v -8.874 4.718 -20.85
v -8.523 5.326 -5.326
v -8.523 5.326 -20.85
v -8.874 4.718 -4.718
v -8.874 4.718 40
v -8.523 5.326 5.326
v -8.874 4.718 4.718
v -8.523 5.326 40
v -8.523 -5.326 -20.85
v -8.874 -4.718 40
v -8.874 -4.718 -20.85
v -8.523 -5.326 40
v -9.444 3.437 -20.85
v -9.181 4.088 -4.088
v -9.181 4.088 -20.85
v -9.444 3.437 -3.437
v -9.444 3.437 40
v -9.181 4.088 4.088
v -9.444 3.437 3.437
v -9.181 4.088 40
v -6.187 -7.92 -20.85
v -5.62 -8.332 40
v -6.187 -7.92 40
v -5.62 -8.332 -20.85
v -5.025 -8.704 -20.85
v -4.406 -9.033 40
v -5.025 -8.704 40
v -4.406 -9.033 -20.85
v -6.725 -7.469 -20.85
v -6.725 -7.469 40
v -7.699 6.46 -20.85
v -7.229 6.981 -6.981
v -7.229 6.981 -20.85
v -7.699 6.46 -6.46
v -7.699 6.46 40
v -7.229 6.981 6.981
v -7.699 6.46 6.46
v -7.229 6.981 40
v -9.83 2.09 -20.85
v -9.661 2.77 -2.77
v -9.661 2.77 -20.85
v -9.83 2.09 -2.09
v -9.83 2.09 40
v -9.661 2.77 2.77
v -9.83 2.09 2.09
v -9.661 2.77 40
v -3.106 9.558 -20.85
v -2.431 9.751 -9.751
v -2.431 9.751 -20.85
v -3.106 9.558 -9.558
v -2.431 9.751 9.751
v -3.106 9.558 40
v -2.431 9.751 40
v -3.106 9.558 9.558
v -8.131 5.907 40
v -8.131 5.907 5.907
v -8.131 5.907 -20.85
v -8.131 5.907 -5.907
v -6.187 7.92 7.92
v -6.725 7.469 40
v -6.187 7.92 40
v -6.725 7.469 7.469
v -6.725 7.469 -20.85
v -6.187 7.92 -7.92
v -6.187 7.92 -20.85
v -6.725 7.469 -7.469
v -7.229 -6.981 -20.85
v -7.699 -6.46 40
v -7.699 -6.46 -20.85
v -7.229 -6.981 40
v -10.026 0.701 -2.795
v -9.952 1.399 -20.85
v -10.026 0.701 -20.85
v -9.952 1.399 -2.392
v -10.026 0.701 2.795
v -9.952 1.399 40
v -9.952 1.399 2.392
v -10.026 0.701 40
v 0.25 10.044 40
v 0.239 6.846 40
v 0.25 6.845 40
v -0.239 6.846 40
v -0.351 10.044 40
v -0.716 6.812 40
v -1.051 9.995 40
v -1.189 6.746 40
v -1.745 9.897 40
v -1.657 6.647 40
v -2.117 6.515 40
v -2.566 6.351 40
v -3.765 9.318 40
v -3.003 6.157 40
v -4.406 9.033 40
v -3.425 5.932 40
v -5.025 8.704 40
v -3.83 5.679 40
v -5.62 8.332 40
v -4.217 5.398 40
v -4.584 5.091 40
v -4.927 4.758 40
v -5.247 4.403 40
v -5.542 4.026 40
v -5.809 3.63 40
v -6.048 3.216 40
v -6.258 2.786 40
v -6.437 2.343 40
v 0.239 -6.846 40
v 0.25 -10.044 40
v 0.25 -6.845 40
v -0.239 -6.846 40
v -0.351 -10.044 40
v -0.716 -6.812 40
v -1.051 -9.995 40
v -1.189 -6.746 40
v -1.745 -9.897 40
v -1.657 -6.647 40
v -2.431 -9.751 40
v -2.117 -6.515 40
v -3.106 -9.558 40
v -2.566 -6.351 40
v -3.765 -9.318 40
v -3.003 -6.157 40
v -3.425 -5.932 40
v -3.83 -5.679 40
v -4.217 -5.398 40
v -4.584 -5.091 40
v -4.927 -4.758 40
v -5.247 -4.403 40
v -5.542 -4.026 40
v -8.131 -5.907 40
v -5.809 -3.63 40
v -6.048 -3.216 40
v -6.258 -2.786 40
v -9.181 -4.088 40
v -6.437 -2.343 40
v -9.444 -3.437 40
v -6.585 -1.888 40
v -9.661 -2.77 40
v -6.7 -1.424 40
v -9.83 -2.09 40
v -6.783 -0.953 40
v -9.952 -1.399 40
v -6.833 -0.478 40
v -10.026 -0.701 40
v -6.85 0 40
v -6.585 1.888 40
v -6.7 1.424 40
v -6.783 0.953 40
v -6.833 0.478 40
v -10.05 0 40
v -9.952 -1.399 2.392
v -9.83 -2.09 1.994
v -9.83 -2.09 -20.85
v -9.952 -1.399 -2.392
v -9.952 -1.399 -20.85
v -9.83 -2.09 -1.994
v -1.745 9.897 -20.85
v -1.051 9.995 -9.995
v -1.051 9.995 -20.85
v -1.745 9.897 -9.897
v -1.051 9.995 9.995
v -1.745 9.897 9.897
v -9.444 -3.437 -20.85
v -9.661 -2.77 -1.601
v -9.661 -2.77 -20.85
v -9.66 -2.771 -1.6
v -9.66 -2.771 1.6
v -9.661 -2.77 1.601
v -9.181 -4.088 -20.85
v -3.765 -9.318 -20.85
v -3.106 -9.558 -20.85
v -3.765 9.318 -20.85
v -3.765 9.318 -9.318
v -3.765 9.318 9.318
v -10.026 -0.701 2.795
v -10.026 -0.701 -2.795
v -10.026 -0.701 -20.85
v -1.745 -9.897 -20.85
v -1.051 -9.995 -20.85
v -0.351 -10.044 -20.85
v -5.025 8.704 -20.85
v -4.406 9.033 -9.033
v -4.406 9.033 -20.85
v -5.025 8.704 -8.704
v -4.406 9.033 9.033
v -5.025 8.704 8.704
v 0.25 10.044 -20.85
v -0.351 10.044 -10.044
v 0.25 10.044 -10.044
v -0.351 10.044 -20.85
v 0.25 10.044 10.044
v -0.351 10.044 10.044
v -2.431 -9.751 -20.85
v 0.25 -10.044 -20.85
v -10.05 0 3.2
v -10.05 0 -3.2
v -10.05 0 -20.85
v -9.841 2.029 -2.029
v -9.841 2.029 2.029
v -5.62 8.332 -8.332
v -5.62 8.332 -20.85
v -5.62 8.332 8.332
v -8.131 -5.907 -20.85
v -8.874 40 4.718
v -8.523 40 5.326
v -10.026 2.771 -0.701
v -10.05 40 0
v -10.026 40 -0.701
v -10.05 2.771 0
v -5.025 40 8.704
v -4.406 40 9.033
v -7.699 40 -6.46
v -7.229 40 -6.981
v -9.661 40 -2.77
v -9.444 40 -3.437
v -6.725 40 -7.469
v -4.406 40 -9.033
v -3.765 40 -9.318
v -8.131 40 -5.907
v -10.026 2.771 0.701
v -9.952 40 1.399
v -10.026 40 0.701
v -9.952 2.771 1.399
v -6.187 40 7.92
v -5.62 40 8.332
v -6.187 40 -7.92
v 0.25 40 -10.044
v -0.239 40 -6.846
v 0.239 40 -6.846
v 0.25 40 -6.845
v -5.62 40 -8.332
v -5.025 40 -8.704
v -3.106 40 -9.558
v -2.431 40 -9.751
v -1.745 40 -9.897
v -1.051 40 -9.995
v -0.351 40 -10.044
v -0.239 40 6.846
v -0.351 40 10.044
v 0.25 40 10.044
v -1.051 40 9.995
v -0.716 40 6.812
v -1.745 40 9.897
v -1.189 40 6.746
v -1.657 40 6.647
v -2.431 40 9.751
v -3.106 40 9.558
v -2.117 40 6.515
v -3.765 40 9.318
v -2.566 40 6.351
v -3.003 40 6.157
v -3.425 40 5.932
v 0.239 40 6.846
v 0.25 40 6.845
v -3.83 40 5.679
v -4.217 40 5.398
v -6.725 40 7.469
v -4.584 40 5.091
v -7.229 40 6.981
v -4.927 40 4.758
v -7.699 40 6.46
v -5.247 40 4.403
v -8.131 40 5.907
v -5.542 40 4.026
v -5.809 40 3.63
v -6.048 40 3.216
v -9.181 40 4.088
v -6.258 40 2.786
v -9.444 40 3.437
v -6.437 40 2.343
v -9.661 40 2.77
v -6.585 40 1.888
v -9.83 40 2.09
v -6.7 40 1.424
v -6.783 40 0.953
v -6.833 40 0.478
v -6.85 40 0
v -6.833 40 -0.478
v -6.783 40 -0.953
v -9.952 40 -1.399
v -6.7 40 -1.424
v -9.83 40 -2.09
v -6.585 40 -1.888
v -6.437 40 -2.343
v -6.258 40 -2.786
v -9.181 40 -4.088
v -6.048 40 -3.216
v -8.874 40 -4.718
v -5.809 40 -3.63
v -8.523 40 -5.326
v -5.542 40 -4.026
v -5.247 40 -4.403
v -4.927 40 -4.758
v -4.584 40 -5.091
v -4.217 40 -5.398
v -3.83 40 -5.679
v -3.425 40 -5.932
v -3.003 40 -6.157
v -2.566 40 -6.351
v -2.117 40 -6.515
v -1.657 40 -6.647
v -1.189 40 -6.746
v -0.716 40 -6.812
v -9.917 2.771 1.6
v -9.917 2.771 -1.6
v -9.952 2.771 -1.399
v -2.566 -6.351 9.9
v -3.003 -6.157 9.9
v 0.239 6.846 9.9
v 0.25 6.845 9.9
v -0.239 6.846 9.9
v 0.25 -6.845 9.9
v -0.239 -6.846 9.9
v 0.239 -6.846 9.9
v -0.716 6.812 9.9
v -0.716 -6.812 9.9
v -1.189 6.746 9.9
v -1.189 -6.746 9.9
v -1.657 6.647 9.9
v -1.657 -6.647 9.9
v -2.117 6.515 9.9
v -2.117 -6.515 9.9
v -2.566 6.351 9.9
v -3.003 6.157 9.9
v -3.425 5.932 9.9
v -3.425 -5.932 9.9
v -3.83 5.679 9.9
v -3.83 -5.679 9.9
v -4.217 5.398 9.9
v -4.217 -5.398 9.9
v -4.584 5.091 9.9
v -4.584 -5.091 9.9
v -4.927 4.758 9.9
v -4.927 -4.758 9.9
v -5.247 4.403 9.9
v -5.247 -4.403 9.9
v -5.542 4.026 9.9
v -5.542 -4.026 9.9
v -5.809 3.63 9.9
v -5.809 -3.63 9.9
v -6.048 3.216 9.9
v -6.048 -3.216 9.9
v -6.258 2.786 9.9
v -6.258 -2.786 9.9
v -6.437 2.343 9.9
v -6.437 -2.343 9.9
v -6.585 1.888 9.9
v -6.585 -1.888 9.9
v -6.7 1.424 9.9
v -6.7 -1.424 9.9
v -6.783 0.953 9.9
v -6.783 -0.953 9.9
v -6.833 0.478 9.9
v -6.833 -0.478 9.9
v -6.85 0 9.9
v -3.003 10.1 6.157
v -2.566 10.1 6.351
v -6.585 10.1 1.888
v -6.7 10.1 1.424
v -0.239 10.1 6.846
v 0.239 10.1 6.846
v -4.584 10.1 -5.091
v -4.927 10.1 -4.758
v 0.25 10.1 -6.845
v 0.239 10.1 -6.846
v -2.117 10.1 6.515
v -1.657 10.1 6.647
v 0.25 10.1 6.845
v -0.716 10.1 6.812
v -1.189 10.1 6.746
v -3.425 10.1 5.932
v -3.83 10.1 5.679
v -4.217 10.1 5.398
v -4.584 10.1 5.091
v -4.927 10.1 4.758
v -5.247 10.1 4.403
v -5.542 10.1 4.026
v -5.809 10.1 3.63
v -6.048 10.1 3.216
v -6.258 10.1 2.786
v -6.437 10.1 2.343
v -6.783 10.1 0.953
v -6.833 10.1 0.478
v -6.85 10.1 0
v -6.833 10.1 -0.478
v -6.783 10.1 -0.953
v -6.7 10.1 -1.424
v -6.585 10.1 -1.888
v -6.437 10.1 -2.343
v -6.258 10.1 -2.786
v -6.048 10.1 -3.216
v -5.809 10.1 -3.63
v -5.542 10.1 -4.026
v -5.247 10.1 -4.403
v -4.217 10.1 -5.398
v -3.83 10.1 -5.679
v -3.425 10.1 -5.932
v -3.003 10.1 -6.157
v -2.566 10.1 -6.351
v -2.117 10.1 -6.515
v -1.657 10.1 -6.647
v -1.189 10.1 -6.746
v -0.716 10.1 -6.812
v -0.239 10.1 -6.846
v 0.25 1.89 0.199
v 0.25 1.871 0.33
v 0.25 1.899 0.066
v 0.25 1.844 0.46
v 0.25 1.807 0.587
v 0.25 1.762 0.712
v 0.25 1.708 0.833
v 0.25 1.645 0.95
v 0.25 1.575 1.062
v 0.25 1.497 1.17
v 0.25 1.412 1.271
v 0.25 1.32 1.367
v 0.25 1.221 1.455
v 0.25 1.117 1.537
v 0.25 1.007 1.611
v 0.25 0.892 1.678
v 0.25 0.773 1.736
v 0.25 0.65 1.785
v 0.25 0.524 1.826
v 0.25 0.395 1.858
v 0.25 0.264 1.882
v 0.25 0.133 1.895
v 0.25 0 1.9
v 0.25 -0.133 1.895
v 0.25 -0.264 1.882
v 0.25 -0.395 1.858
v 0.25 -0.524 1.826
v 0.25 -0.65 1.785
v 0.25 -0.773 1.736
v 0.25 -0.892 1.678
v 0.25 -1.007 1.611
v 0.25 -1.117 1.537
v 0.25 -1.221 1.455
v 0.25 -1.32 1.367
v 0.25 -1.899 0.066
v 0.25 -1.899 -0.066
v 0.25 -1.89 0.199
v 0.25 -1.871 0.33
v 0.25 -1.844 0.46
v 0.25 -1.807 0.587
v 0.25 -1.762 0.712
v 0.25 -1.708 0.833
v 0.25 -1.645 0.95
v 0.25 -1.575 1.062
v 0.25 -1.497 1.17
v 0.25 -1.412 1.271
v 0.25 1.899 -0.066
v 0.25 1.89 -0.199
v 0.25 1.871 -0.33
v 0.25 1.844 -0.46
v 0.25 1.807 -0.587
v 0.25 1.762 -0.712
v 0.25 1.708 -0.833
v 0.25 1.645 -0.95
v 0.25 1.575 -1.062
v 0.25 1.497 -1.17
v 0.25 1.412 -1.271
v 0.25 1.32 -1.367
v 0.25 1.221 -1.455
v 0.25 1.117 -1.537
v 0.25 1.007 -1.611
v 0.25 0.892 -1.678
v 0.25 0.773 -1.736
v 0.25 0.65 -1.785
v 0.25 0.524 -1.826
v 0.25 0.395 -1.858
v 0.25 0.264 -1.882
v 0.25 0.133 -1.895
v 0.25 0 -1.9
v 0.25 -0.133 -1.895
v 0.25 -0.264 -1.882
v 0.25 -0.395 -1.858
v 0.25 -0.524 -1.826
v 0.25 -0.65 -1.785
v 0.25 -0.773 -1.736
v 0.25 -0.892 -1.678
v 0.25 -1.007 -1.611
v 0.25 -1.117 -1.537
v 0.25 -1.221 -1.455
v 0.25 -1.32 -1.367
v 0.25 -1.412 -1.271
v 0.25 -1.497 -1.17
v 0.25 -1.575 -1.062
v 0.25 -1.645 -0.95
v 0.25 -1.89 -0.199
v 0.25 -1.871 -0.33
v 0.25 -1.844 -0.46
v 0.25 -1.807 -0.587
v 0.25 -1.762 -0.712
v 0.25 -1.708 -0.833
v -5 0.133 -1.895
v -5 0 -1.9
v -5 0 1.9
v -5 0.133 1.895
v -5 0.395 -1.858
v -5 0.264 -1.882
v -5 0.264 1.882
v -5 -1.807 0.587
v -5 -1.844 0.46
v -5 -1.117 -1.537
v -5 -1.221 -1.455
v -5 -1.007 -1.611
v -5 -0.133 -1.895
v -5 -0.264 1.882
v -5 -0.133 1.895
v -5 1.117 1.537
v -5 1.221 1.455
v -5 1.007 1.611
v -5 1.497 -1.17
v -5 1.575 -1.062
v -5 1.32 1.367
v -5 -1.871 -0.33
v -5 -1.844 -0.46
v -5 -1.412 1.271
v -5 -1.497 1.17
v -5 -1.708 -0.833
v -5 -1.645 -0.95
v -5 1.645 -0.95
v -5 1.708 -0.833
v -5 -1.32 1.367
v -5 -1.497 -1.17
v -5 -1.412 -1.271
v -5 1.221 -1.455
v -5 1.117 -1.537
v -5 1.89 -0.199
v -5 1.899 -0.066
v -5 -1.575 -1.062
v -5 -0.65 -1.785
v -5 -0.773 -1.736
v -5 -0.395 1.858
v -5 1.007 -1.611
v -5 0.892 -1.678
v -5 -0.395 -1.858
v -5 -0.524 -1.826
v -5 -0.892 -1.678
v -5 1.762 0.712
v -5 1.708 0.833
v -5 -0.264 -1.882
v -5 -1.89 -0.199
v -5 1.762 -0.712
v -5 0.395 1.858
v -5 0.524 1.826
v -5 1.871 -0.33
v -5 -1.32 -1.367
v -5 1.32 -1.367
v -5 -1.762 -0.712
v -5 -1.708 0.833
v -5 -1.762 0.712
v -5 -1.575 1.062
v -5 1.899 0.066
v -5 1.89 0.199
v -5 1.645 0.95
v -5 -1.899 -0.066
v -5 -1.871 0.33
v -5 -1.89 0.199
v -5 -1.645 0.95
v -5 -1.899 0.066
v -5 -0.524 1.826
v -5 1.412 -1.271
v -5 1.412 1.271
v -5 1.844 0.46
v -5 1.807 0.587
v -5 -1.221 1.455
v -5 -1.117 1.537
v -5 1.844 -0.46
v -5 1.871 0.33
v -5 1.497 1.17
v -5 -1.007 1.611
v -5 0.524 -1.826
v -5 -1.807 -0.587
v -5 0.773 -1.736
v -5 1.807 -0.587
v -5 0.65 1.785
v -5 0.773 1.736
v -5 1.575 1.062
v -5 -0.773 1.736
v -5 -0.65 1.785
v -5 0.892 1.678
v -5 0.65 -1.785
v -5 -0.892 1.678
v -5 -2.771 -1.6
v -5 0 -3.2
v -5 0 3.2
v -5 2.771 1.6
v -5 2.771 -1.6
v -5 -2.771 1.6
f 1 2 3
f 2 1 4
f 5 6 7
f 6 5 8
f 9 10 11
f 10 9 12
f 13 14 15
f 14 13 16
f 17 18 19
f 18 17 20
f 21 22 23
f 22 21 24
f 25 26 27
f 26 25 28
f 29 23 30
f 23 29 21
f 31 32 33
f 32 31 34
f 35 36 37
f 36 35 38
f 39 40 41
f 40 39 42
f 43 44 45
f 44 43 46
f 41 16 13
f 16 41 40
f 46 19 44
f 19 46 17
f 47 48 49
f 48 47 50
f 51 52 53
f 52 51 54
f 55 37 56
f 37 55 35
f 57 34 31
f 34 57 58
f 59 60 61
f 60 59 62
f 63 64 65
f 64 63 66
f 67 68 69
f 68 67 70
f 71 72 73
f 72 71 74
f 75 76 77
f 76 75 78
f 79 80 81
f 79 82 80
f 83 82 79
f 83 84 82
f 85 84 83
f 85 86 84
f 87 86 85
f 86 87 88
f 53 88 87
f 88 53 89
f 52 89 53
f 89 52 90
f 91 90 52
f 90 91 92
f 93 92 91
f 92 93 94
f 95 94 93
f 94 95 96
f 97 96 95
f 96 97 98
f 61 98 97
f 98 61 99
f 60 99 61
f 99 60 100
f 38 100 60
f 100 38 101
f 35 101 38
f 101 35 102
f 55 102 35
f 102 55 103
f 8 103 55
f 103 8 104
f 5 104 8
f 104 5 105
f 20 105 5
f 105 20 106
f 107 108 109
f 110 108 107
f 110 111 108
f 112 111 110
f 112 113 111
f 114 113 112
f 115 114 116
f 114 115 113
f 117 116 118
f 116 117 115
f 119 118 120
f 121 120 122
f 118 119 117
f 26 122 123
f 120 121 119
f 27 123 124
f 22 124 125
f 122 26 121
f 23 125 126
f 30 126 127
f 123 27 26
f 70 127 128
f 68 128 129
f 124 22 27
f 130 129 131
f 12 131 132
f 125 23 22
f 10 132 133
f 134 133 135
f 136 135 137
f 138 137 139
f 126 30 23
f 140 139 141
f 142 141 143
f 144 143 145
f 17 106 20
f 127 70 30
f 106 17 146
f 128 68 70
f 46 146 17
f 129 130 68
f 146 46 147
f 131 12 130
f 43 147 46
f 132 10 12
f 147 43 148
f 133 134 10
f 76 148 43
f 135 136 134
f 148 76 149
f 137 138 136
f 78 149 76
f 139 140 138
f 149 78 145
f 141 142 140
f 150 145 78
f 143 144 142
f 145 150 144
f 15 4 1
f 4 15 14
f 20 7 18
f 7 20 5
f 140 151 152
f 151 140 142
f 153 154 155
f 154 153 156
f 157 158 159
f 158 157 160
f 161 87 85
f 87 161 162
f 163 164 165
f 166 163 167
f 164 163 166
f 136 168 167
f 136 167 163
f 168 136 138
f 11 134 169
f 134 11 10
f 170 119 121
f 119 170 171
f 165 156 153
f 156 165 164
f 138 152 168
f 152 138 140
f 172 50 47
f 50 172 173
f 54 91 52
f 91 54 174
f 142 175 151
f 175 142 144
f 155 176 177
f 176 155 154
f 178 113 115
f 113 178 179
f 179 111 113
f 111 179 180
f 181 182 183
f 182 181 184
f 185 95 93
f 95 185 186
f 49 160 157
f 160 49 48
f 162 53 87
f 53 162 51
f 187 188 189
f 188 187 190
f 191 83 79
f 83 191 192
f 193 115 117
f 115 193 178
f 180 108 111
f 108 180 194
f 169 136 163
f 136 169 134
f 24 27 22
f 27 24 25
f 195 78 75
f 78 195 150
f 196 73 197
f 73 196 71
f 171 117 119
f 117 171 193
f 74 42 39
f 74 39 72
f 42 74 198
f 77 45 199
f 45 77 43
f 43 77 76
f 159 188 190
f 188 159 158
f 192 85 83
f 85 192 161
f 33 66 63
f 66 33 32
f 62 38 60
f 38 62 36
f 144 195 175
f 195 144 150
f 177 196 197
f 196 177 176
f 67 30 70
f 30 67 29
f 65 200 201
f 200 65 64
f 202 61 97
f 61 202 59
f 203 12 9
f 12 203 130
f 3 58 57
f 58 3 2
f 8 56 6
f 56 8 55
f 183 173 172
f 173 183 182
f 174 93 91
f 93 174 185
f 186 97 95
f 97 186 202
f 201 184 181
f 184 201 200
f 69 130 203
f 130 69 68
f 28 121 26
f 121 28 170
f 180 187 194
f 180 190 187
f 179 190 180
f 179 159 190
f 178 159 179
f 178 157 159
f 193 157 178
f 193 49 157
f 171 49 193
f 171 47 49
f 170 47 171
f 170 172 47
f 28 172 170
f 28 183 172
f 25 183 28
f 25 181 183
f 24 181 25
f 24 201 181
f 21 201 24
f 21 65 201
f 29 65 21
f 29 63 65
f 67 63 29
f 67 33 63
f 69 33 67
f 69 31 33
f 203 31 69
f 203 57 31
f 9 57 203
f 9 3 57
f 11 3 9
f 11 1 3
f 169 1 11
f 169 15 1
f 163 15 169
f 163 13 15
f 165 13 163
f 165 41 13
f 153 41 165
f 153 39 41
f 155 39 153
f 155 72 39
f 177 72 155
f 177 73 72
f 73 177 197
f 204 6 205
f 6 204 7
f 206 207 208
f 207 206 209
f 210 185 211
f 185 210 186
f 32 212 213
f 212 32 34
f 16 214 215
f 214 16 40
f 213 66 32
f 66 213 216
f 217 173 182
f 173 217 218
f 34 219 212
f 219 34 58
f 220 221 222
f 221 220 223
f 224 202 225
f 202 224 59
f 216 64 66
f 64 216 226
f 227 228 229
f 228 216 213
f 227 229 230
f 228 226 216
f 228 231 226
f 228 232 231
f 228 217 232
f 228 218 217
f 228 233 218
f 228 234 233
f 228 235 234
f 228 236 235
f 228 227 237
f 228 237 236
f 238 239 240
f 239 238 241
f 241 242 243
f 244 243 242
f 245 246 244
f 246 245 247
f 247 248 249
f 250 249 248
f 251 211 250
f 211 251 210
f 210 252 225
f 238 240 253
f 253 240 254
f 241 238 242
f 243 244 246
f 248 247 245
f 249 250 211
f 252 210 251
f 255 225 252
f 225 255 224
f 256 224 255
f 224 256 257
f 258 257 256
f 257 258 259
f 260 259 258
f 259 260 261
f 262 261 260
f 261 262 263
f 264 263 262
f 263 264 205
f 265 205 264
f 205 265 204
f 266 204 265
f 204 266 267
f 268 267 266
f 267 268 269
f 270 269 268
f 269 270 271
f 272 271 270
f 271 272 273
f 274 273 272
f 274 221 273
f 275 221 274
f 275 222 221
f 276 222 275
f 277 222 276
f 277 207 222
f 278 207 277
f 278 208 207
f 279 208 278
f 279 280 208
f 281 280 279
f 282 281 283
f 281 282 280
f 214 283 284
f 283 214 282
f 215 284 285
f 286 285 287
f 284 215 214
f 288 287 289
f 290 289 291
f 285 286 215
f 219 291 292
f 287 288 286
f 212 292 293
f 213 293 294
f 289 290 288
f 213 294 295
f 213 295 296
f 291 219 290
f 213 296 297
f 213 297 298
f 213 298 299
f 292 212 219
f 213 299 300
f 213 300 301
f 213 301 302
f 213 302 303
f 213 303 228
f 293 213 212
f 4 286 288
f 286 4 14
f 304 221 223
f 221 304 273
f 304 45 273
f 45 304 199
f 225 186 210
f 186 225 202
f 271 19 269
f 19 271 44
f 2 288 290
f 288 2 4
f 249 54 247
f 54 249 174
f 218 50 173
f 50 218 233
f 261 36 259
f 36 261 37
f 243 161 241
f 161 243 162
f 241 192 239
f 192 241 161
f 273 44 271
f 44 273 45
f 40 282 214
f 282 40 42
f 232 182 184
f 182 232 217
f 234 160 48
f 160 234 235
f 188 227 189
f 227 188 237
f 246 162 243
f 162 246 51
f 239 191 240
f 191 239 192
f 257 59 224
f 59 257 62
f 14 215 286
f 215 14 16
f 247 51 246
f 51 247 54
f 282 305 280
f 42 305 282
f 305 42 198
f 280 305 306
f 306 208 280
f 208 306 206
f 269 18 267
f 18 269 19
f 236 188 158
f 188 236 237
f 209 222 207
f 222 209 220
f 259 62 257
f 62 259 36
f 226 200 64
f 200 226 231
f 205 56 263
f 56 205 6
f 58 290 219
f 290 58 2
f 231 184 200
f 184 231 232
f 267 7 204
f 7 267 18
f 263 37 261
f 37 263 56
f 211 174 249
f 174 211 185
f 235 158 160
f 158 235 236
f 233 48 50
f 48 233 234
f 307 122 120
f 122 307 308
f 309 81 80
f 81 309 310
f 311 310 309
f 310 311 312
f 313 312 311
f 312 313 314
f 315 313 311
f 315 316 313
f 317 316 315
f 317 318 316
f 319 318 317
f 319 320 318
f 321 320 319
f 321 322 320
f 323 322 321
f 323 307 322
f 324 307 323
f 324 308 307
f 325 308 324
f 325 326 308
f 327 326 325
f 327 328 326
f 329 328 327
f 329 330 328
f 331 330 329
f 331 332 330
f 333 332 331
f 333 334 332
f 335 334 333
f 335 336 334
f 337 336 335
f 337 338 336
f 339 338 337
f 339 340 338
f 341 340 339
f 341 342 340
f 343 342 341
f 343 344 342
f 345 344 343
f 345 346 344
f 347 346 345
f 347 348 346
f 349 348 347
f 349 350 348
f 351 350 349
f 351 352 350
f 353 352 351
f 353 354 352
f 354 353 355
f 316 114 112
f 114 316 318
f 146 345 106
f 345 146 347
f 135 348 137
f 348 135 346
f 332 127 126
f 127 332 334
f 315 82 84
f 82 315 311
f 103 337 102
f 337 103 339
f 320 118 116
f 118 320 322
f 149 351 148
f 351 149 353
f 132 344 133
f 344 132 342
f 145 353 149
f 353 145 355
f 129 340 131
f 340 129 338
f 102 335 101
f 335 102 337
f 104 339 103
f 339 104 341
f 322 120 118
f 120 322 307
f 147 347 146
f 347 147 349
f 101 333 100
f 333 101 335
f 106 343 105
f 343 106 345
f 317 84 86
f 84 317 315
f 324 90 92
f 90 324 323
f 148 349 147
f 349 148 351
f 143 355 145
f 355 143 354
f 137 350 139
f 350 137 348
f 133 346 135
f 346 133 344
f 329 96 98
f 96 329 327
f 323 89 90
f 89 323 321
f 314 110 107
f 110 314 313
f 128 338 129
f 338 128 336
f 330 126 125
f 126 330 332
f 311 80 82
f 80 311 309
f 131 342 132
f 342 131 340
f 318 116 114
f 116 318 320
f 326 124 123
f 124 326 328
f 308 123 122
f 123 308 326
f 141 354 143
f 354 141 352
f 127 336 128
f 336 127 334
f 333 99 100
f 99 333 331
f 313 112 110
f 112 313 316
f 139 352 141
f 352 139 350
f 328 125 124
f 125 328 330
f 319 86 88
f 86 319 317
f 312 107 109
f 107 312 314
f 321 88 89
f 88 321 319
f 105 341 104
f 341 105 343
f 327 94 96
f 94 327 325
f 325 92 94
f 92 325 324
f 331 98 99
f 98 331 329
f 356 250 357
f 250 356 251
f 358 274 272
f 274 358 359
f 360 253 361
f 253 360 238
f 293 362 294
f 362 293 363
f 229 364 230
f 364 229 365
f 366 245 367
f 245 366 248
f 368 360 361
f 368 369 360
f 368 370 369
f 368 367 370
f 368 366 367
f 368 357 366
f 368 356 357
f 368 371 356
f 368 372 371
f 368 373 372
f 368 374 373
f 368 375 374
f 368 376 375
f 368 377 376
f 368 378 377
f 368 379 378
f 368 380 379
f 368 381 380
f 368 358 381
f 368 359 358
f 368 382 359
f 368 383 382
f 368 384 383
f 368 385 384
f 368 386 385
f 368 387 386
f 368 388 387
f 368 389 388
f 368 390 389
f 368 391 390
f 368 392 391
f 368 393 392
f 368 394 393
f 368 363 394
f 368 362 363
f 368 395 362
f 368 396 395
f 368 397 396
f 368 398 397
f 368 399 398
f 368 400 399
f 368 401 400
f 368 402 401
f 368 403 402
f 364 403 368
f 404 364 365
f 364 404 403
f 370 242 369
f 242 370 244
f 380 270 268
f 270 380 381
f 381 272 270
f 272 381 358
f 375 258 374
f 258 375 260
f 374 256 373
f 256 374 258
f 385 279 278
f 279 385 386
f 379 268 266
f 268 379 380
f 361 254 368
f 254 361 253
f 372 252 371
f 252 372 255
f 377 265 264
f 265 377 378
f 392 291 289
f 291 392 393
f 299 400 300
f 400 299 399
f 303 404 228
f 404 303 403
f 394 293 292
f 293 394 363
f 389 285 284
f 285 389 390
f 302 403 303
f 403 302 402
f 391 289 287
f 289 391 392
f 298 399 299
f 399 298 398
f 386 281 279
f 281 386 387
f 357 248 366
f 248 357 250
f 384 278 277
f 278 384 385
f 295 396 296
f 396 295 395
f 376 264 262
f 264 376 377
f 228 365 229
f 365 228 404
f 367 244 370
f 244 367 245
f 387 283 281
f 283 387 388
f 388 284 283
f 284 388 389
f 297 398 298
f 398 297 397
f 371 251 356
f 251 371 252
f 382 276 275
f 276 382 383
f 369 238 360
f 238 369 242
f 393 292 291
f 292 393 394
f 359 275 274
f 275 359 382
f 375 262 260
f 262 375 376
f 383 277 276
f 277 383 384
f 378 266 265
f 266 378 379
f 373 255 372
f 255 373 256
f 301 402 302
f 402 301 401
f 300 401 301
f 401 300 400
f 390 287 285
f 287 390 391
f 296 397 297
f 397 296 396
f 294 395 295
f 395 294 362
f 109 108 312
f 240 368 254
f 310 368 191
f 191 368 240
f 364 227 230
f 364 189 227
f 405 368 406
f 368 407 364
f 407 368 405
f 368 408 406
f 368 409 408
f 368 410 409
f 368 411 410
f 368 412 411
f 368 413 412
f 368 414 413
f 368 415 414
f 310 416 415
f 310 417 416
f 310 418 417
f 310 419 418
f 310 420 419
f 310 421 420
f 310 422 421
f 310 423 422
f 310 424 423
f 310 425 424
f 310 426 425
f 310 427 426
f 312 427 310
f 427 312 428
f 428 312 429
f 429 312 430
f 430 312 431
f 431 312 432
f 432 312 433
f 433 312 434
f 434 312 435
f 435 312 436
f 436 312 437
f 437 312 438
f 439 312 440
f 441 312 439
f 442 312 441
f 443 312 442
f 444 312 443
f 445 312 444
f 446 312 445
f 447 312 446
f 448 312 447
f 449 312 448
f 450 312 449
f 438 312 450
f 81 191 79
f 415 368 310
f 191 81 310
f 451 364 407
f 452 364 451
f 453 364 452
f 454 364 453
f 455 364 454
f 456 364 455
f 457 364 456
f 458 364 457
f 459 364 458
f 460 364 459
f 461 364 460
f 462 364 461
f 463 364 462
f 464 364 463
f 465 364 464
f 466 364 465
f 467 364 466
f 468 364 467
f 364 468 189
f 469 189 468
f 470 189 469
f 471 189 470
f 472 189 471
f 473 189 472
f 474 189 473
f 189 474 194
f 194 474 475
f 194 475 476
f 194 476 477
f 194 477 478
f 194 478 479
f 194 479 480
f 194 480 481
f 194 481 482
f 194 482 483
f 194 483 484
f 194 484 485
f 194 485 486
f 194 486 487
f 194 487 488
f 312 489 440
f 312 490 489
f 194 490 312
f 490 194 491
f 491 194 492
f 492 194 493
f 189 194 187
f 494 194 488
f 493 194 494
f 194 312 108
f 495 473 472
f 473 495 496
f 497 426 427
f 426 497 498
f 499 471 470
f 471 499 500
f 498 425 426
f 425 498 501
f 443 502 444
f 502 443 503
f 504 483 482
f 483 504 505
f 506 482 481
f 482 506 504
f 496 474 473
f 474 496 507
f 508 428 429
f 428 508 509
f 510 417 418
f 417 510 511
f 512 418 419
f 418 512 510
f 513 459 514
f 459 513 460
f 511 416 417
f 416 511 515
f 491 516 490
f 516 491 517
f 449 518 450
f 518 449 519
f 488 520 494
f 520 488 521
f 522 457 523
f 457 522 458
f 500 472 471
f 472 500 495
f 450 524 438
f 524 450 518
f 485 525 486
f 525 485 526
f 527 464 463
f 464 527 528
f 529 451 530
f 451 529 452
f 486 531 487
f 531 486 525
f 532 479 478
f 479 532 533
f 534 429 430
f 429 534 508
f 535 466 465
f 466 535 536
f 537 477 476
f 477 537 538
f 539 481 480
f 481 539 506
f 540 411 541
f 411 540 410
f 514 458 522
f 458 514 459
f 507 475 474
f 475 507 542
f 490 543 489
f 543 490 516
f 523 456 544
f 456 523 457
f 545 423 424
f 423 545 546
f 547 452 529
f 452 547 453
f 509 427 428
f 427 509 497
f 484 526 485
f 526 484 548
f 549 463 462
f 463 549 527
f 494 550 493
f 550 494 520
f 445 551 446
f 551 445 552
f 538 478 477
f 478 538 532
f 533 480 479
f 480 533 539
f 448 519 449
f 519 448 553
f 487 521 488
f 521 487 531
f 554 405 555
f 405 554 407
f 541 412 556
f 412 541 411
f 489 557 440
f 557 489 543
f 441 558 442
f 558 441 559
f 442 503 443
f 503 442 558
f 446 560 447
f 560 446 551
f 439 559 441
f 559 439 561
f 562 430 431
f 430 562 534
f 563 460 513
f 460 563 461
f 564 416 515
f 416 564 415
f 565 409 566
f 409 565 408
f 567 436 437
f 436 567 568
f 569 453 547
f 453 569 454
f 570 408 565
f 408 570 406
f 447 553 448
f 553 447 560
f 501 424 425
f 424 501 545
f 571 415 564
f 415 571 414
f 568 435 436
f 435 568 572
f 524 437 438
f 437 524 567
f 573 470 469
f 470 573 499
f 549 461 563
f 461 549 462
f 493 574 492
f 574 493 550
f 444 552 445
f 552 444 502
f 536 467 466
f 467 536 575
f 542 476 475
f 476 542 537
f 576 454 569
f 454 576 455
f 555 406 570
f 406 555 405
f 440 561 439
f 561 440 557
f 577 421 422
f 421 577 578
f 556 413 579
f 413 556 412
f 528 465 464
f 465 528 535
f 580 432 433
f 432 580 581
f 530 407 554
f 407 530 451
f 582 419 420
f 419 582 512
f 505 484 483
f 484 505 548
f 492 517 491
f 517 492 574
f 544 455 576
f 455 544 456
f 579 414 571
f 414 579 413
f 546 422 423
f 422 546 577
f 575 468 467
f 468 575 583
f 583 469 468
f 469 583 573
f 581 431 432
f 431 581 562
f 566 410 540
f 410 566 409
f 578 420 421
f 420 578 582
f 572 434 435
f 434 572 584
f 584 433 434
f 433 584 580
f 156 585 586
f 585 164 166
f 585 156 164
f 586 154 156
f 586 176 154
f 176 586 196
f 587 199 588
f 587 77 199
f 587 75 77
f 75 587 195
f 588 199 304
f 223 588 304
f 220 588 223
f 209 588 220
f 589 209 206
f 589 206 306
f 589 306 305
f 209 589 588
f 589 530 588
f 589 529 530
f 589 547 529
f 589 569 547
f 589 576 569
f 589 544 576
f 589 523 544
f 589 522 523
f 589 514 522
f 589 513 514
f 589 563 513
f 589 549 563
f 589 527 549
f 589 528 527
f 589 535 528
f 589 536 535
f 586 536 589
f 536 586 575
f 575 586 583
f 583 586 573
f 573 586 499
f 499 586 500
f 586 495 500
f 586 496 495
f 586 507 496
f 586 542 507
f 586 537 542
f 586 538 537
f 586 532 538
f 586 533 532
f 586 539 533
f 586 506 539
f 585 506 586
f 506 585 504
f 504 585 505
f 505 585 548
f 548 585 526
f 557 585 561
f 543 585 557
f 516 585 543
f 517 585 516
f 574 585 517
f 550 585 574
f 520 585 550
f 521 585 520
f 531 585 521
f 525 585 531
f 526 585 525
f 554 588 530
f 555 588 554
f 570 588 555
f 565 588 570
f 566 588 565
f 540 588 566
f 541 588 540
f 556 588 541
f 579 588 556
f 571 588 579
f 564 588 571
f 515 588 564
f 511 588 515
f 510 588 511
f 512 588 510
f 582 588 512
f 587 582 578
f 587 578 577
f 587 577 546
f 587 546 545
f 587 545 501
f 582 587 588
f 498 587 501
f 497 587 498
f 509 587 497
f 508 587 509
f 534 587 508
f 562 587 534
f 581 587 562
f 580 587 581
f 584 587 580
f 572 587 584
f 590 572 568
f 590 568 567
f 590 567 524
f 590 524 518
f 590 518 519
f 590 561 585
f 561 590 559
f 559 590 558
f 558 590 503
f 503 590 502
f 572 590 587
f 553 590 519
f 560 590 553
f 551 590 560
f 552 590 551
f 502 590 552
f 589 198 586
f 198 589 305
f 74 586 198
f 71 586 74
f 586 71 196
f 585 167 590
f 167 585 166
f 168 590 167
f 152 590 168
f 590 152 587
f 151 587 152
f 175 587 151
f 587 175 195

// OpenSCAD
$fa=4; // default minimum facet angle is now 0.5
$fs=0.05; // default minimum facet size is now 0.05 mm

tolerance = .1;

clampGap = .25;
pipeRad = 6.75 + tolerance;
insertDepth = 30;
totalLen = 40;
groundHeight = 14;
wallThickness = 3.2;

screwHeadExtraGap = .75;
screwRad = 1.5 + 4 * tolerance;
screwHeadRad = 2.25 + screwHeadExtraGap;
nutRad = 3.1 + tolerance;

mirror([0, 1, 0]) {
  difference() {
    union() {
      translate([0, 0, -groundHeight - pipeRad]) cylinder(h = totalLen + groundHeight + pipeRad, r = pipeRad + wallThickness);
      rotate([90, 0, 0]) cylinder(h = totalLen, r = pipeRad + wallThickness);
    }

    union() {
      translate([0, 0, totalLen - insertDepth -.1]) cylinder(h = insertDepth + .2, r = pipeRad);
      translate([0, insertDepth - totalLen -.1, 0]) rotate([90, 0, 0]) cylinder(h = insertDepth + .1, r = pipeRad);
      translate([clampGap, -50, -50]) cube([20, 100, 100]);
      rotate([0, 90, 0]) cylinder(h = 50, r = screwRad, center=true);
      translate([-5, 0, 0]) rotate([0, -90, 0]) linear_extrude(50) hexagon(nutRad);
    }
  }
}

module hexagon(r = 1) {
  polygon([
    [-1 * r, 0],
    [-.5 * r, r * sqrt(3) / 2],
    [.5 * r, r * sqrt(3) / 2],
    [1 * r, 0],
    [.5 * r, r * sqrt(3) / -2],
    [-.5 * r, r * sqrt(3) / -2],
  ]);
}
